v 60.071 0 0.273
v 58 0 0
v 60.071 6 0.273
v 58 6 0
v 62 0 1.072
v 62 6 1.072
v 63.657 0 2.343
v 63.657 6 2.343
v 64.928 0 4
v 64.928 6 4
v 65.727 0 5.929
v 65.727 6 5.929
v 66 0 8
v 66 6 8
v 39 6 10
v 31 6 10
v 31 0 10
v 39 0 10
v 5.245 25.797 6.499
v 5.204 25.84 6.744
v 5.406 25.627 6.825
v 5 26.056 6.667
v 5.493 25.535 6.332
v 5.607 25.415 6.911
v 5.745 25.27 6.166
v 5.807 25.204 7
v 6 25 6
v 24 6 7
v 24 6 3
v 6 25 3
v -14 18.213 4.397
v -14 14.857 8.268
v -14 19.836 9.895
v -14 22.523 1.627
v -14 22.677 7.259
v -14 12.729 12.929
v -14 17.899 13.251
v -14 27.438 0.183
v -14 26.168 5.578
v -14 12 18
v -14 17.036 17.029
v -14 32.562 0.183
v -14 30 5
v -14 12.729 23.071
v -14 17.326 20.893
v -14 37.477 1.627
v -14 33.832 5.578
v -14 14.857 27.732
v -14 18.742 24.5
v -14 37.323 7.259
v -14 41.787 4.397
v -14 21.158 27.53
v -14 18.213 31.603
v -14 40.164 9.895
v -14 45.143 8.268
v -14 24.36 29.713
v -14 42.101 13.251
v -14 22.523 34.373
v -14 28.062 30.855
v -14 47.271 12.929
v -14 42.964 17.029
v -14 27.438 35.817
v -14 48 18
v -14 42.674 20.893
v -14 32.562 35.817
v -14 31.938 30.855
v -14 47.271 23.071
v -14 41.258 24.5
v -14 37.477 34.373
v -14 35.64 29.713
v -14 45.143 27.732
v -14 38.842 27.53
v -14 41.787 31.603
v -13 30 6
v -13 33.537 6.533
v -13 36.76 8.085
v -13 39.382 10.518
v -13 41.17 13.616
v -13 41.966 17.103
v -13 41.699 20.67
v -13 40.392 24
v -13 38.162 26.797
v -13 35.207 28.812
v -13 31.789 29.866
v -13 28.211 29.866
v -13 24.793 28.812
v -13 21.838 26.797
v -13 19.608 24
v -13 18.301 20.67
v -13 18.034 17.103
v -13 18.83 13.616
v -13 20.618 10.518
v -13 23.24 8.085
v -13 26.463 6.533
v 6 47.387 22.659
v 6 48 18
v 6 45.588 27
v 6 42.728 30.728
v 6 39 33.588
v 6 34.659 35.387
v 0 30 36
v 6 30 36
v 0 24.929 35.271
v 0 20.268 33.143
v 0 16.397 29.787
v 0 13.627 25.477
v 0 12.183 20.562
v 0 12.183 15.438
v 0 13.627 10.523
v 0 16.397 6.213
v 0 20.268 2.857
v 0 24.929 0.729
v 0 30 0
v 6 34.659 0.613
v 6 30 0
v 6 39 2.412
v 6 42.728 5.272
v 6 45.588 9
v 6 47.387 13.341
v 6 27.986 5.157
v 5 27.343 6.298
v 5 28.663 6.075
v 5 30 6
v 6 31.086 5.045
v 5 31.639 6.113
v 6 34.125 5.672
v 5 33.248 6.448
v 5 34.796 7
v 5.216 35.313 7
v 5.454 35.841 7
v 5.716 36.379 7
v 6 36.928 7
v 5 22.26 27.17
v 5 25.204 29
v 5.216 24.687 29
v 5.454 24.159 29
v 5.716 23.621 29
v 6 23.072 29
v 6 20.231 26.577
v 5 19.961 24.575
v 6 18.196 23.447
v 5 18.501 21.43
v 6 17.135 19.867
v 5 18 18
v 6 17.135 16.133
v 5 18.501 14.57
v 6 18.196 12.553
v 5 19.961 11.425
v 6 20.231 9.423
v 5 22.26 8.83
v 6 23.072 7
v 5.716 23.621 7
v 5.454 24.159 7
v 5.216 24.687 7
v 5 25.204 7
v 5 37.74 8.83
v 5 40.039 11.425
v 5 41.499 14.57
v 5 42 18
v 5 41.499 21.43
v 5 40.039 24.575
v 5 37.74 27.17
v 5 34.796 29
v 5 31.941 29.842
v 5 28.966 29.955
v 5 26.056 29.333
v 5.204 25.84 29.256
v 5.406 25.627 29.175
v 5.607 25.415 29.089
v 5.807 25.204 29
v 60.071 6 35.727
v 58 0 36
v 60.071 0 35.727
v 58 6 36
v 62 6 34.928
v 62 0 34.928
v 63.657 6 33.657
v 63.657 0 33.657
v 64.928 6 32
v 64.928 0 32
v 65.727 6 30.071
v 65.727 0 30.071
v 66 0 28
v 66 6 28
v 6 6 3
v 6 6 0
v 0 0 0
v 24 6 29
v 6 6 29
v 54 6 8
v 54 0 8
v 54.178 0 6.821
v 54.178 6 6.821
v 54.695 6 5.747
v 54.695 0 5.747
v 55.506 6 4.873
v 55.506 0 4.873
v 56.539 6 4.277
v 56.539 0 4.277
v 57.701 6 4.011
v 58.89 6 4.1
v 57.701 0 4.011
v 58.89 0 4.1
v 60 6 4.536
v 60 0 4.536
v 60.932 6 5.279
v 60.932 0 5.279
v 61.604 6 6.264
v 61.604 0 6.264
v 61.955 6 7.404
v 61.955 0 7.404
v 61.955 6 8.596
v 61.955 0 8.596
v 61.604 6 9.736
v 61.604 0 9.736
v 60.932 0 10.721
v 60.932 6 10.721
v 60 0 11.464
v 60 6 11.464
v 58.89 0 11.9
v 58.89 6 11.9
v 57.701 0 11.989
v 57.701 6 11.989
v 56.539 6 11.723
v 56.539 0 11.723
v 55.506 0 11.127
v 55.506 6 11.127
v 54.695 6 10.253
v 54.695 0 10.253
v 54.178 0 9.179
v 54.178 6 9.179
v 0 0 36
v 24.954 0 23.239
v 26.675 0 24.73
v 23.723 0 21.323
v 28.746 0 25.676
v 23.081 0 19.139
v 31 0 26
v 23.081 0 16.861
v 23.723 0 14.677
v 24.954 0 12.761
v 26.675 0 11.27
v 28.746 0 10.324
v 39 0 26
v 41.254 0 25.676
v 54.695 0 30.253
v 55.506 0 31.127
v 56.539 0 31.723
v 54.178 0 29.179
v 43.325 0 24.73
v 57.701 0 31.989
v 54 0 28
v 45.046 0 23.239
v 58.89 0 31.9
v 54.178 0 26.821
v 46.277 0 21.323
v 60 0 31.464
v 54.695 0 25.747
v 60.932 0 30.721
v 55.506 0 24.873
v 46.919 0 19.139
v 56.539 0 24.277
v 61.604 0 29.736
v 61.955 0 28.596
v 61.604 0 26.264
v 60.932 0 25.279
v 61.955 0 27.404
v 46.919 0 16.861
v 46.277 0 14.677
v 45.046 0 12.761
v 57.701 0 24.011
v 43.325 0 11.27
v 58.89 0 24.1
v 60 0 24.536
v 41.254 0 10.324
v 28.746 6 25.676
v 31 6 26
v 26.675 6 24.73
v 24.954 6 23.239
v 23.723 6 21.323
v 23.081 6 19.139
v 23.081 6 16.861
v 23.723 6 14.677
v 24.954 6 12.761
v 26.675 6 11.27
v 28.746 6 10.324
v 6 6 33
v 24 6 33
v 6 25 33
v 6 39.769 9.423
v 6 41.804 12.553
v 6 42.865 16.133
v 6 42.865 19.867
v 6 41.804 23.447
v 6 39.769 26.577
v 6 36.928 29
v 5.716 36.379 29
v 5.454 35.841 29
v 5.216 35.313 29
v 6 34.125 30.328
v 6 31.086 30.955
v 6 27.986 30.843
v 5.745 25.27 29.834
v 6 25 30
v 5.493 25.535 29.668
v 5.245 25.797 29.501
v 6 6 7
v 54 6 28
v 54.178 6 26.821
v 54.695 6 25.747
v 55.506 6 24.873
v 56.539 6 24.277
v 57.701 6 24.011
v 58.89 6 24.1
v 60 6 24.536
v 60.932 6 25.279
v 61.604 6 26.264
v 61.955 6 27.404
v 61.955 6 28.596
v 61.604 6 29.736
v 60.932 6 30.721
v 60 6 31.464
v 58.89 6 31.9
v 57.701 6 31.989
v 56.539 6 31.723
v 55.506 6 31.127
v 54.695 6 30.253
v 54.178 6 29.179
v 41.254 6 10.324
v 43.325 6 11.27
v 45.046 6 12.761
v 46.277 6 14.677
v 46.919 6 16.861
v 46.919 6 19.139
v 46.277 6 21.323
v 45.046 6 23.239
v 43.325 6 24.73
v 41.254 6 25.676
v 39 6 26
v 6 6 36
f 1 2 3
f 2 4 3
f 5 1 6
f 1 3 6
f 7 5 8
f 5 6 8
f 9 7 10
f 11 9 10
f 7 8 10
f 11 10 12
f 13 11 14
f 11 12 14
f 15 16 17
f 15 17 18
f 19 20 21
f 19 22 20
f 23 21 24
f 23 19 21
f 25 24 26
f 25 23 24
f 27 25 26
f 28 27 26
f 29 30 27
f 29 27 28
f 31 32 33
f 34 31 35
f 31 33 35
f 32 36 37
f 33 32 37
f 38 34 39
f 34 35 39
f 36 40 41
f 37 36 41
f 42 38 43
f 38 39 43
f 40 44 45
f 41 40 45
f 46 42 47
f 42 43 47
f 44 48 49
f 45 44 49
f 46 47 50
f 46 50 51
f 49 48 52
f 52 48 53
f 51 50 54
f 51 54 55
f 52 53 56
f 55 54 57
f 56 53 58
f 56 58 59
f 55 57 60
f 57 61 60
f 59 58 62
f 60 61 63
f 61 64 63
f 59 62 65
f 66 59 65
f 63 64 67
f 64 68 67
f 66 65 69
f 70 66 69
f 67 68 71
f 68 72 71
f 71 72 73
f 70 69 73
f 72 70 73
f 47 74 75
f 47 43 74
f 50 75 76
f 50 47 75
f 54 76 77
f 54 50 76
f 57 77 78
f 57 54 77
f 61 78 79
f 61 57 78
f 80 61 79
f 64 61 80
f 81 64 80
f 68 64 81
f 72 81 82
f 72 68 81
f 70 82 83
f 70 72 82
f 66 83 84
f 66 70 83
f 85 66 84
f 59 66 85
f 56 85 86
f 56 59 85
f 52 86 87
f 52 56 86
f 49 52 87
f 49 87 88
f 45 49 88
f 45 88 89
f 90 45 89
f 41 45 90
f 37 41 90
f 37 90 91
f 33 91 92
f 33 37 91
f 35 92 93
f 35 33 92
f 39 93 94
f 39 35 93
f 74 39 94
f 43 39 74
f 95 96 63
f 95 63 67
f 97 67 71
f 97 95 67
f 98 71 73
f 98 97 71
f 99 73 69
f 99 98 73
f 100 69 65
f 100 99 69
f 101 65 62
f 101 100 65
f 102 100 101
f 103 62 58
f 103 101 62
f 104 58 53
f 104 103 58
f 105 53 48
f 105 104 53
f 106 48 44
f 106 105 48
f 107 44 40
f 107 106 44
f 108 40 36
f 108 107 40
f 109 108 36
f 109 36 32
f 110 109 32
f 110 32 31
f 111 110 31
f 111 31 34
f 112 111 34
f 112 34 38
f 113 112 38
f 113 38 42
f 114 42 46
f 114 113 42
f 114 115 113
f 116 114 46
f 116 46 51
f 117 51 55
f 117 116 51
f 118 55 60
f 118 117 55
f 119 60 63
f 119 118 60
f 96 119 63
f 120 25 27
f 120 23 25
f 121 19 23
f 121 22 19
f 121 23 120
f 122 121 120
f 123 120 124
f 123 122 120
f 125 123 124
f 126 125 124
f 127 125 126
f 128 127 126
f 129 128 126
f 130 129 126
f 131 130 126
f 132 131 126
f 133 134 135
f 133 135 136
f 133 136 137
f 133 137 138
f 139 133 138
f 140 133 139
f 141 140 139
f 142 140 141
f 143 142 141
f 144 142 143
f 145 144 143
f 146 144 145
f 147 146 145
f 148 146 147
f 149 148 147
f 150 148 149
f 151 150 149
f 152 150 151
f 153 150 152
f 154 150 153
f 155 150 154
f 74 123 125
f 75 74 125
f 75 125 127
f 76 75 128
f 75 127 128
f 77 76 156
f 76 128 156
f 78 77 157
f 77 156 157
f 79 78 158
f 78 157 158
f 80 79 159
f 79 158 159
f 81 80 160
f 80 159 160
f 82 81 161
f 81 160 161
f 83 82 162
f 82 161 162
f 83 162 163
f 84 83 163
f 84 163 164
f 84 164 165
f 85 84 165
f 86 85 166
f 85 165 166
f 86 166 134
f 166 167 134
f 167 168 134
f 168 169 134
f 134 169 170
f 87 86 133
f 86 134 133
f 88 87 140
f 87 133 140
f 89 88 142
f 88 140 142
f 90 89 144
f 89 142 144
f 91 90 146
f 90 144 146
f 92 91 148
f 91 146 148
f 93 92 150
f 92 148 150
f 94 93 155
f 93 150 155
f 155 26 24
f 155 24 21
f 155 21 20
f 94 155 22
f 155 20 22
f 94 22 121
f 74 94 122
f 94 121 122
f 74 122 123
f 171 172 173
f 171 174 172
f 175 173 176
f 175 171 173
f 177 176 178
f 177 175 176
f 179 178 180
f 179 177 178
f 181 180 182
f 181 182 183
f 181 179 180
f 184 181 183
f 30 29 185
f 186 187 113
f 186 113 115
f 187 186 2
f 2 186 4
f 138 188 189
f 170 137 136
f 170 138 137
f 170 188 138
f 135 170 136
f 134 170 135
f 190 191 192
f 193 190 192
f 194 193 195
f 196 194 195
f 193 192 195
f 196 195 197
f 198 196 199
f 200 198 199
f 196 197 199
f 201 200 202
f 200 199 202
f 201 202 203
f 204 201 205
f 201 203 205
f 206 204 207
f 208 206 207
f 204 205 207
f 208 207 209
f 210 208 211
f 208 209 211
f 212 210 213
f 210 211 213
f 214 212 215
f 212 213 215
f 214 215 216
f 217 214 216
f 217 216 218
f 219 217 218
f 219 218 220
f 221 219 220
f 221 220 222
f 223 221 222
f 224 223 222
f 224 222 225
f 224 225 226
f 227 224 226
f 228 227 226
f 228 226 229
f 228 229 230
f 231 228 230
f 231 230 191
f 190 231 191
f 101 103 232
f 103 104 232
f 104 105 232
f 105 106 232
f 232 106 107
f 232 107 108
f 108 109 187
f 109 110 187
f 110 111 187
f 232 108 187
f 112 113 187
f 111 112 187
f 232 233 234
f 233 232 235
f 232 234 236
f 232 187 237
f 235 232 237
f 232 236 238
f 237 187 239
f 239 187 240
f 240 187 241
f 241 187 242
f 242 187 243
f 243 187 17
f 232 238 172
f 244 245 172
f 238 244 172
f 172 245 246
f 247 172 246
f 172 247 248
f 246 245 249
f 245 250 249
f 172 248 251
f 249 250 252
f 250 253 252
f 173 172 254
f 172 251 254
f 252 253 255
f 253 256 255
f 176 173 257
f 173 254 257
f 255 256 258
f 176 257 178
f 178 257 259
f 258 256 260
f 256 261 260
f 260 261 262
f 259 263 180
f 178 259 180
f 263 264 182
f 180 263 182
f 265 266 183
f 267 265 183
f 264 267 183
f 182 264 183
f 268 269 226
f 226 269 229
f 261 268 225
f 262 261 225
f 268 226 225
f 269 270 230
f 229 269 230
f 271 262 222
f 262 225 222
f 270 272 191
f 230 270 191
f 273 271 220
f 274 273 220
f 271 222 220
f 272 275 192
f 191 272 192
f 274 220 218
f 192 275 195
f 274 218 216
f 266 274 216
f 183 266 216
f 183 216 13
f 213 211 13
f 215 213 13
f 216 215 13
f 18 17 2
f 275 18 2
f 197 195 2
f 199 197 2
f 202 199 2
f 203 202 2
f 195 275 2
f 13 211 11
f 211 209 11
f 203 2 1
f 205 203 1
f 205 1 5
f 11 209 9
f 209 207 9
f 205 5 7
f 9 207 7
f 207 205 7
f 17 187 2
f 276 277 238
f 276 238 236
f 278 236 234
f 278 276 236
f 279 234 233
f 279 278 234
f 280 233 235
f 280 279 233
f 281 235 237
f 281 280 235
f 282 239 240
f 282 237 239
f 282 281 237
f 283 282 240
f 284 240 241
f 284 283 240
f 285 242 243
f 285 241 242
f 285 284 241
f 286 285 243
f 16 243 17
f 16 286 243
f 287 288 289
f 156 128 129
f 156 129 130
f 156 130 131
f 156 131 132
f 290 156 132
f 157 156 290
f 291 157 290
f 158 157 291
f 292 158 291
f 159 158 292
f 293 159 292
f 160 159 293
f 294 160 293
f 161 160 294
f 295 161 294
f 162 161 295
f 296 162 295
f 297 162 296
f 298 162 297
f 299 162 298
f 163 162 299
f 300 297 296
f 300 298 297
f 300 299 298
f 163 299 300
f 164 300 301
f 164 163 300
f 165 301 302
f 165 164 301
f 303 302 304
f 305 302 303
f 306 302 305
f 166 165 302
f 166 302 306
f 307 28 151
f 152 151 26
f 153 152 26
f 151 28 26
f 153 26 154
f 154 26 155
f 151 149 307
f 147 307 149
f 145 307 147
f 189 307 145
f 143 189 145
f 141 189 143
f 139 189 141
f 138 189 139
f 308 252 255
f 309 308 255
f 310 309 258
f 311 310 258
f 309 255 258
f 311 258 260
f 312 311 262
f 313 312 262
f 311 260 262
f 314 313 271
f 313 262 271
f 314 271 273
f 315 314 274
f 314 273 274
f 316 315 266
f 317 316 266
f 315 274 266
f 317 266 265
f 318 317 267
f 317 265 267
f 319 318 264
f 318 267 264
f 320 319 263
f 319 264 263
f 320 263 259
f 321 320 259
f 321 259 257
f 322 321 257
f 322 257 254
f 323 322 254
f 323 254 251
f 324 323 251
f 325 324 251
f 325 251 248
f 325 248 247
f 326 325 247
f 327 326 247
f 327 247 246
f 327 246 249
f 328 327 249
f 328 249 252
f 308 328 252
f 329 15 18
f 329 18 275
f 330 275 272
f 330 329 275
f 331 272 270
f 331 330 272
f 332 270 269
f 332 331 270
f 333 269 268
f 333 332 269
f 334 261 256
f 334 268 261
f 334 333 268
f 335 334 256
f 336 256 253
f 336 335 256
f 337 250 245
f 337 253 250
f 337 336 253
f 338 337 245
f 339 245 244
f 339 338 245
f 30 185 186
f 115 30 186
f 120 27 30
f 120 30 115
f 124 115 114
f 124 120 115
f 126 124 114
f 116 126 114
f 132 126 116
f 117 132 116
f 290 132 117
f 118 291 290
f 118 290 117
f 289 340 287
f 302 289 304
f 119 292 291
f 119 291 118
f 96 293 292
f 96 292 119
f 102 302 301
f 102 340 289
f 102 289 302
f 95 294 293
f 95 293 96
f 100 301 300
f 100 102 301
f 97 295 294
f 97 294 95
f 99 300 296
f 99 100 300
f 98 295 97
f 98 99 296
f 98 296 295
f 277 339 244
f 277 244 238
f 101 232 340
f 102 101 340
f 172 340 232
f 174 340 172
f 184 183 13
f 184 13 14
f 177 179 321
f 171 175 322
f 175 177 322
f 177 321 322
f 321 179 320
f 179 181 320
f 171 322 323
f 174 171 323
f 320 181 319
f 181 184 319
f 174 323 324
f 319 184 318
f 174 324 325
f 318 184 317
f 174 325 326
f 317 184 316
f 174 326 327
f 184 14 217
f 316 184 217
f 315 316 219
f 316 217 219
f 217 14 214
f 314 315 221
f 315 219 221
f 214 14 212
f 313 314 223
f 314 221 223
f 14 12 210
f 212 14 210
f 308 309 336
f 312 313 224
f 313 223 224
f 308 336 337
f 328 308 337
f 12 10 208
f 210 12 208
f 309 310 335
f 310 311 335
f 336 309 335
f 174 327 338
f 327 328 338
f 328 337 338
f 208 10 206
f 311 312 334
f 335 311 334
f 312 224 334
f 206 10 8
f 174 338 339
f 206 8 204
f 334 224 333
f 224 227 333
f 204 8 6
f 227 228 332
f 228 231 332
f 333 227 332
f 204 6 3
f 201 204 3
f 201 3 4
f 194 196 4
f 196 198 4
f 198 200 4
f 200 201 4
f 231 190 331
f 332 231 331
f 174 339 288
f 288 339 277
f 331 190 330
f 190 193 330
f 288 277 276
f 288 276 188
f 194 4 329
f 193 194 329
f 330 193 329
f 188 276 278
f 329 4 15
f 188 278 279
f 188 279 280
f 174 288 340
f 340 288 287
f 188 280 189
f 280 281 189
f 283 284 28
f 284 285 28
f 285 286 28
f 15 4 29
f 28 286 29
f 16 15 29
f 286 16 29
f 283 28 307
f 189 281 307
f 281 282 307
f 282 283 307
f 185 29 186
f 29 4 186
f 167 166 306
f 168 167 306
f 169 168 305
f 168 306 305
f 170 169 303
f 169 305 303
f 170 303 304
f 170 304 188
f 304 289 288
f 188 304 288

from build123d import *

# Parameters (mm, degrees)
BOSS_EXTRUDE1_DEPTH = 36
SKETCH2_R           = 18
BOSS_EXTRUDE2_DEPTH = 20
BOSS_EXTRUDE3_START = 3
BOSS_EXTRUDE3_DEPTH = 4
HOLE1_D             = 24
CHAMFER1_SIZE       = 1
CUT_EXTRUDE1_DEPTH  = 87.116200566
FILLET1_R           = 8
HOLE2_D             = 8


with BuildPart() as part:
    # Sketch1 → Boss-Extrude1 (new body)
    with BuildSketch(Plane.XY):
        Polygon((0, 30), (0, 0), (66, 0), (66, 6), (6, 6), (6, 30), align=None)
    extrude(amount=BOSS_EXTRUDE1_DEPTH)

    # Sketch2 → Boss-Extrude2 (add)
    with BuildSketch(Plane(origin=(6, 0, 0), x_dir=(0, 0, -1), z_dir=(1, 0, 0))):
        with Locations(Location((-18, 30, 0), (0, 0, 90))):
            Circle(SKETCH2_R)
    extrude(amount=-BOSS_EXTRUDE2_DEPTH)

    # Sketch3 → Boss-Extrude3 (add)
    with BuildSketch(Plane.XY.offset(BOSS_EXTRUDE3_START)):
        Polygon((6, 25), (24, 6), (6, 6), align=None)
    boss_extrude3 = extrude(amount=BOSS_EXTRUDE3_DEPTH)

    # Mirror1: Boss-Extrude3 across plane
    add(boss_extrude3.mirror(Plane.XY.offset(18)))

    # Hole1 (through all)
    with Locations(Plane.ZY.offset(14)):
        with Locations((18, 30)):
            Hole(HOLE1_D / 2)

    # Chamfer1
    # the kernel refuses this chamfer: 1 mm, written as the material it takes off along each edge
    with BuildSketch(Plane(origin=(-14, 30, 18), x_dir=(0, 0, -1), z_dir=(0, -1, 0))) as chamfer1_piece_1:
        Polygon((12, CHAMFER1_SIZE), (12 + CHAMFER1_SIZE, 0), (12, 0), align=None)
    revolve(axis=Axis((-14, 30, 18), (1, 0, 0)), mode=Mode.SUBTRACT)
    with BuildSketch(Plane(origin=(6, 30, 18), x_dir=(0, 0, -1), z_dir=(0, -1, 0))) as chamfer1_piece_2_section:
        Polygon((12 + CHAMFER1_SIZE, 0), (12, -CHAMFER1_SIZE), (12, 0), align=None)
    chamfer1_piece_2 = revolve(axis=Axis((6, 30, 18), (1, 0, 0)), mode=Mode.PRIVATE)
    chamfer1_piece_2 = split(chamfer1_piece_2, bisect_by=Plane(origin=(1.543769163, 29.703799217, 6.002209696), z_dir=(0.7259526839058266, 0.6877446479107833, 0)), keep=Keep.TOP, mode=Mode.PRIVATE)
    add(chamfer1_piece_2, mode=Mode.SUBTRACT)
    with BuildSketch(Plane(origin=(6, 30, 18), x_dir=(0, 0, -1), z_dir=(0, -1, 0))) as chamfer1_piece_3_section:
        Polygon((12 + CHAMFER1_SIZE, 0), (12, -CHAMFER1_SIZE), (12, 0), align=None)
    chamfer1_piece_3 = revolve(axis=Axis((6, 30, 18), (1, 0, 0)), mode=Mode.PRIVATE)
    chamfer1_piece_3 = split(chamfer1_piece_3, bisect_by=Plane(origin=(5.516878747, 17.516878747, 7), z_dir=(0, 0, 1)), keep=Keep.TOP, mode=Mode.PRIVATE)
    chamfer1_piece_3 = split(chamfer1_piece_3, bisect_by=Plane(origin=(5.516878747, 17.516878747, 29), z_dir=(0, 0, -1)), keep=Keep.TOP, mode=Mode.PRIVATE)
    add(chamfer1_piece_3, mode=Mode.SUBTRACT)

    # Sketch7 → Cut-Extrude1 (cut, through all)
    with BuildSketch(Plane(origin=(0, 6, 0), x_dir=(1, 0, 0), z_dir=(0, 1, 0))):
        with BuildLine():
            Line((31, -10), (39, -10))
            ThreePointArc((39, -10), (47, -18), (39, -26))
            Line((39, -26), (31, -26))
            ThreePointArc((31, -26), (23, -18), (31, -10))
        make_face()
    extrude(amount=-CUT_EXTRUDE1_DEPTH, mode=Mode.SUBTRACT)

    # Fillet1
    fillet1_edges = [part.edges().sort_by_distance(p)[0] for p in [
        (66, 3, 36),
        (66, 3, 0),
    ]]
    fillet(fillet1_edges, radius=FILLET1_R)

    # Hole2 (through all)
    with Locations(Plane(origin=(0, 6, 0), x_dir=(1, 0, 0), z_dir=(0, 1, 0))):
        with Locations((58, -8), (58, -28)):
            Hole(HOLE2_D / 2)


solid = part.part
